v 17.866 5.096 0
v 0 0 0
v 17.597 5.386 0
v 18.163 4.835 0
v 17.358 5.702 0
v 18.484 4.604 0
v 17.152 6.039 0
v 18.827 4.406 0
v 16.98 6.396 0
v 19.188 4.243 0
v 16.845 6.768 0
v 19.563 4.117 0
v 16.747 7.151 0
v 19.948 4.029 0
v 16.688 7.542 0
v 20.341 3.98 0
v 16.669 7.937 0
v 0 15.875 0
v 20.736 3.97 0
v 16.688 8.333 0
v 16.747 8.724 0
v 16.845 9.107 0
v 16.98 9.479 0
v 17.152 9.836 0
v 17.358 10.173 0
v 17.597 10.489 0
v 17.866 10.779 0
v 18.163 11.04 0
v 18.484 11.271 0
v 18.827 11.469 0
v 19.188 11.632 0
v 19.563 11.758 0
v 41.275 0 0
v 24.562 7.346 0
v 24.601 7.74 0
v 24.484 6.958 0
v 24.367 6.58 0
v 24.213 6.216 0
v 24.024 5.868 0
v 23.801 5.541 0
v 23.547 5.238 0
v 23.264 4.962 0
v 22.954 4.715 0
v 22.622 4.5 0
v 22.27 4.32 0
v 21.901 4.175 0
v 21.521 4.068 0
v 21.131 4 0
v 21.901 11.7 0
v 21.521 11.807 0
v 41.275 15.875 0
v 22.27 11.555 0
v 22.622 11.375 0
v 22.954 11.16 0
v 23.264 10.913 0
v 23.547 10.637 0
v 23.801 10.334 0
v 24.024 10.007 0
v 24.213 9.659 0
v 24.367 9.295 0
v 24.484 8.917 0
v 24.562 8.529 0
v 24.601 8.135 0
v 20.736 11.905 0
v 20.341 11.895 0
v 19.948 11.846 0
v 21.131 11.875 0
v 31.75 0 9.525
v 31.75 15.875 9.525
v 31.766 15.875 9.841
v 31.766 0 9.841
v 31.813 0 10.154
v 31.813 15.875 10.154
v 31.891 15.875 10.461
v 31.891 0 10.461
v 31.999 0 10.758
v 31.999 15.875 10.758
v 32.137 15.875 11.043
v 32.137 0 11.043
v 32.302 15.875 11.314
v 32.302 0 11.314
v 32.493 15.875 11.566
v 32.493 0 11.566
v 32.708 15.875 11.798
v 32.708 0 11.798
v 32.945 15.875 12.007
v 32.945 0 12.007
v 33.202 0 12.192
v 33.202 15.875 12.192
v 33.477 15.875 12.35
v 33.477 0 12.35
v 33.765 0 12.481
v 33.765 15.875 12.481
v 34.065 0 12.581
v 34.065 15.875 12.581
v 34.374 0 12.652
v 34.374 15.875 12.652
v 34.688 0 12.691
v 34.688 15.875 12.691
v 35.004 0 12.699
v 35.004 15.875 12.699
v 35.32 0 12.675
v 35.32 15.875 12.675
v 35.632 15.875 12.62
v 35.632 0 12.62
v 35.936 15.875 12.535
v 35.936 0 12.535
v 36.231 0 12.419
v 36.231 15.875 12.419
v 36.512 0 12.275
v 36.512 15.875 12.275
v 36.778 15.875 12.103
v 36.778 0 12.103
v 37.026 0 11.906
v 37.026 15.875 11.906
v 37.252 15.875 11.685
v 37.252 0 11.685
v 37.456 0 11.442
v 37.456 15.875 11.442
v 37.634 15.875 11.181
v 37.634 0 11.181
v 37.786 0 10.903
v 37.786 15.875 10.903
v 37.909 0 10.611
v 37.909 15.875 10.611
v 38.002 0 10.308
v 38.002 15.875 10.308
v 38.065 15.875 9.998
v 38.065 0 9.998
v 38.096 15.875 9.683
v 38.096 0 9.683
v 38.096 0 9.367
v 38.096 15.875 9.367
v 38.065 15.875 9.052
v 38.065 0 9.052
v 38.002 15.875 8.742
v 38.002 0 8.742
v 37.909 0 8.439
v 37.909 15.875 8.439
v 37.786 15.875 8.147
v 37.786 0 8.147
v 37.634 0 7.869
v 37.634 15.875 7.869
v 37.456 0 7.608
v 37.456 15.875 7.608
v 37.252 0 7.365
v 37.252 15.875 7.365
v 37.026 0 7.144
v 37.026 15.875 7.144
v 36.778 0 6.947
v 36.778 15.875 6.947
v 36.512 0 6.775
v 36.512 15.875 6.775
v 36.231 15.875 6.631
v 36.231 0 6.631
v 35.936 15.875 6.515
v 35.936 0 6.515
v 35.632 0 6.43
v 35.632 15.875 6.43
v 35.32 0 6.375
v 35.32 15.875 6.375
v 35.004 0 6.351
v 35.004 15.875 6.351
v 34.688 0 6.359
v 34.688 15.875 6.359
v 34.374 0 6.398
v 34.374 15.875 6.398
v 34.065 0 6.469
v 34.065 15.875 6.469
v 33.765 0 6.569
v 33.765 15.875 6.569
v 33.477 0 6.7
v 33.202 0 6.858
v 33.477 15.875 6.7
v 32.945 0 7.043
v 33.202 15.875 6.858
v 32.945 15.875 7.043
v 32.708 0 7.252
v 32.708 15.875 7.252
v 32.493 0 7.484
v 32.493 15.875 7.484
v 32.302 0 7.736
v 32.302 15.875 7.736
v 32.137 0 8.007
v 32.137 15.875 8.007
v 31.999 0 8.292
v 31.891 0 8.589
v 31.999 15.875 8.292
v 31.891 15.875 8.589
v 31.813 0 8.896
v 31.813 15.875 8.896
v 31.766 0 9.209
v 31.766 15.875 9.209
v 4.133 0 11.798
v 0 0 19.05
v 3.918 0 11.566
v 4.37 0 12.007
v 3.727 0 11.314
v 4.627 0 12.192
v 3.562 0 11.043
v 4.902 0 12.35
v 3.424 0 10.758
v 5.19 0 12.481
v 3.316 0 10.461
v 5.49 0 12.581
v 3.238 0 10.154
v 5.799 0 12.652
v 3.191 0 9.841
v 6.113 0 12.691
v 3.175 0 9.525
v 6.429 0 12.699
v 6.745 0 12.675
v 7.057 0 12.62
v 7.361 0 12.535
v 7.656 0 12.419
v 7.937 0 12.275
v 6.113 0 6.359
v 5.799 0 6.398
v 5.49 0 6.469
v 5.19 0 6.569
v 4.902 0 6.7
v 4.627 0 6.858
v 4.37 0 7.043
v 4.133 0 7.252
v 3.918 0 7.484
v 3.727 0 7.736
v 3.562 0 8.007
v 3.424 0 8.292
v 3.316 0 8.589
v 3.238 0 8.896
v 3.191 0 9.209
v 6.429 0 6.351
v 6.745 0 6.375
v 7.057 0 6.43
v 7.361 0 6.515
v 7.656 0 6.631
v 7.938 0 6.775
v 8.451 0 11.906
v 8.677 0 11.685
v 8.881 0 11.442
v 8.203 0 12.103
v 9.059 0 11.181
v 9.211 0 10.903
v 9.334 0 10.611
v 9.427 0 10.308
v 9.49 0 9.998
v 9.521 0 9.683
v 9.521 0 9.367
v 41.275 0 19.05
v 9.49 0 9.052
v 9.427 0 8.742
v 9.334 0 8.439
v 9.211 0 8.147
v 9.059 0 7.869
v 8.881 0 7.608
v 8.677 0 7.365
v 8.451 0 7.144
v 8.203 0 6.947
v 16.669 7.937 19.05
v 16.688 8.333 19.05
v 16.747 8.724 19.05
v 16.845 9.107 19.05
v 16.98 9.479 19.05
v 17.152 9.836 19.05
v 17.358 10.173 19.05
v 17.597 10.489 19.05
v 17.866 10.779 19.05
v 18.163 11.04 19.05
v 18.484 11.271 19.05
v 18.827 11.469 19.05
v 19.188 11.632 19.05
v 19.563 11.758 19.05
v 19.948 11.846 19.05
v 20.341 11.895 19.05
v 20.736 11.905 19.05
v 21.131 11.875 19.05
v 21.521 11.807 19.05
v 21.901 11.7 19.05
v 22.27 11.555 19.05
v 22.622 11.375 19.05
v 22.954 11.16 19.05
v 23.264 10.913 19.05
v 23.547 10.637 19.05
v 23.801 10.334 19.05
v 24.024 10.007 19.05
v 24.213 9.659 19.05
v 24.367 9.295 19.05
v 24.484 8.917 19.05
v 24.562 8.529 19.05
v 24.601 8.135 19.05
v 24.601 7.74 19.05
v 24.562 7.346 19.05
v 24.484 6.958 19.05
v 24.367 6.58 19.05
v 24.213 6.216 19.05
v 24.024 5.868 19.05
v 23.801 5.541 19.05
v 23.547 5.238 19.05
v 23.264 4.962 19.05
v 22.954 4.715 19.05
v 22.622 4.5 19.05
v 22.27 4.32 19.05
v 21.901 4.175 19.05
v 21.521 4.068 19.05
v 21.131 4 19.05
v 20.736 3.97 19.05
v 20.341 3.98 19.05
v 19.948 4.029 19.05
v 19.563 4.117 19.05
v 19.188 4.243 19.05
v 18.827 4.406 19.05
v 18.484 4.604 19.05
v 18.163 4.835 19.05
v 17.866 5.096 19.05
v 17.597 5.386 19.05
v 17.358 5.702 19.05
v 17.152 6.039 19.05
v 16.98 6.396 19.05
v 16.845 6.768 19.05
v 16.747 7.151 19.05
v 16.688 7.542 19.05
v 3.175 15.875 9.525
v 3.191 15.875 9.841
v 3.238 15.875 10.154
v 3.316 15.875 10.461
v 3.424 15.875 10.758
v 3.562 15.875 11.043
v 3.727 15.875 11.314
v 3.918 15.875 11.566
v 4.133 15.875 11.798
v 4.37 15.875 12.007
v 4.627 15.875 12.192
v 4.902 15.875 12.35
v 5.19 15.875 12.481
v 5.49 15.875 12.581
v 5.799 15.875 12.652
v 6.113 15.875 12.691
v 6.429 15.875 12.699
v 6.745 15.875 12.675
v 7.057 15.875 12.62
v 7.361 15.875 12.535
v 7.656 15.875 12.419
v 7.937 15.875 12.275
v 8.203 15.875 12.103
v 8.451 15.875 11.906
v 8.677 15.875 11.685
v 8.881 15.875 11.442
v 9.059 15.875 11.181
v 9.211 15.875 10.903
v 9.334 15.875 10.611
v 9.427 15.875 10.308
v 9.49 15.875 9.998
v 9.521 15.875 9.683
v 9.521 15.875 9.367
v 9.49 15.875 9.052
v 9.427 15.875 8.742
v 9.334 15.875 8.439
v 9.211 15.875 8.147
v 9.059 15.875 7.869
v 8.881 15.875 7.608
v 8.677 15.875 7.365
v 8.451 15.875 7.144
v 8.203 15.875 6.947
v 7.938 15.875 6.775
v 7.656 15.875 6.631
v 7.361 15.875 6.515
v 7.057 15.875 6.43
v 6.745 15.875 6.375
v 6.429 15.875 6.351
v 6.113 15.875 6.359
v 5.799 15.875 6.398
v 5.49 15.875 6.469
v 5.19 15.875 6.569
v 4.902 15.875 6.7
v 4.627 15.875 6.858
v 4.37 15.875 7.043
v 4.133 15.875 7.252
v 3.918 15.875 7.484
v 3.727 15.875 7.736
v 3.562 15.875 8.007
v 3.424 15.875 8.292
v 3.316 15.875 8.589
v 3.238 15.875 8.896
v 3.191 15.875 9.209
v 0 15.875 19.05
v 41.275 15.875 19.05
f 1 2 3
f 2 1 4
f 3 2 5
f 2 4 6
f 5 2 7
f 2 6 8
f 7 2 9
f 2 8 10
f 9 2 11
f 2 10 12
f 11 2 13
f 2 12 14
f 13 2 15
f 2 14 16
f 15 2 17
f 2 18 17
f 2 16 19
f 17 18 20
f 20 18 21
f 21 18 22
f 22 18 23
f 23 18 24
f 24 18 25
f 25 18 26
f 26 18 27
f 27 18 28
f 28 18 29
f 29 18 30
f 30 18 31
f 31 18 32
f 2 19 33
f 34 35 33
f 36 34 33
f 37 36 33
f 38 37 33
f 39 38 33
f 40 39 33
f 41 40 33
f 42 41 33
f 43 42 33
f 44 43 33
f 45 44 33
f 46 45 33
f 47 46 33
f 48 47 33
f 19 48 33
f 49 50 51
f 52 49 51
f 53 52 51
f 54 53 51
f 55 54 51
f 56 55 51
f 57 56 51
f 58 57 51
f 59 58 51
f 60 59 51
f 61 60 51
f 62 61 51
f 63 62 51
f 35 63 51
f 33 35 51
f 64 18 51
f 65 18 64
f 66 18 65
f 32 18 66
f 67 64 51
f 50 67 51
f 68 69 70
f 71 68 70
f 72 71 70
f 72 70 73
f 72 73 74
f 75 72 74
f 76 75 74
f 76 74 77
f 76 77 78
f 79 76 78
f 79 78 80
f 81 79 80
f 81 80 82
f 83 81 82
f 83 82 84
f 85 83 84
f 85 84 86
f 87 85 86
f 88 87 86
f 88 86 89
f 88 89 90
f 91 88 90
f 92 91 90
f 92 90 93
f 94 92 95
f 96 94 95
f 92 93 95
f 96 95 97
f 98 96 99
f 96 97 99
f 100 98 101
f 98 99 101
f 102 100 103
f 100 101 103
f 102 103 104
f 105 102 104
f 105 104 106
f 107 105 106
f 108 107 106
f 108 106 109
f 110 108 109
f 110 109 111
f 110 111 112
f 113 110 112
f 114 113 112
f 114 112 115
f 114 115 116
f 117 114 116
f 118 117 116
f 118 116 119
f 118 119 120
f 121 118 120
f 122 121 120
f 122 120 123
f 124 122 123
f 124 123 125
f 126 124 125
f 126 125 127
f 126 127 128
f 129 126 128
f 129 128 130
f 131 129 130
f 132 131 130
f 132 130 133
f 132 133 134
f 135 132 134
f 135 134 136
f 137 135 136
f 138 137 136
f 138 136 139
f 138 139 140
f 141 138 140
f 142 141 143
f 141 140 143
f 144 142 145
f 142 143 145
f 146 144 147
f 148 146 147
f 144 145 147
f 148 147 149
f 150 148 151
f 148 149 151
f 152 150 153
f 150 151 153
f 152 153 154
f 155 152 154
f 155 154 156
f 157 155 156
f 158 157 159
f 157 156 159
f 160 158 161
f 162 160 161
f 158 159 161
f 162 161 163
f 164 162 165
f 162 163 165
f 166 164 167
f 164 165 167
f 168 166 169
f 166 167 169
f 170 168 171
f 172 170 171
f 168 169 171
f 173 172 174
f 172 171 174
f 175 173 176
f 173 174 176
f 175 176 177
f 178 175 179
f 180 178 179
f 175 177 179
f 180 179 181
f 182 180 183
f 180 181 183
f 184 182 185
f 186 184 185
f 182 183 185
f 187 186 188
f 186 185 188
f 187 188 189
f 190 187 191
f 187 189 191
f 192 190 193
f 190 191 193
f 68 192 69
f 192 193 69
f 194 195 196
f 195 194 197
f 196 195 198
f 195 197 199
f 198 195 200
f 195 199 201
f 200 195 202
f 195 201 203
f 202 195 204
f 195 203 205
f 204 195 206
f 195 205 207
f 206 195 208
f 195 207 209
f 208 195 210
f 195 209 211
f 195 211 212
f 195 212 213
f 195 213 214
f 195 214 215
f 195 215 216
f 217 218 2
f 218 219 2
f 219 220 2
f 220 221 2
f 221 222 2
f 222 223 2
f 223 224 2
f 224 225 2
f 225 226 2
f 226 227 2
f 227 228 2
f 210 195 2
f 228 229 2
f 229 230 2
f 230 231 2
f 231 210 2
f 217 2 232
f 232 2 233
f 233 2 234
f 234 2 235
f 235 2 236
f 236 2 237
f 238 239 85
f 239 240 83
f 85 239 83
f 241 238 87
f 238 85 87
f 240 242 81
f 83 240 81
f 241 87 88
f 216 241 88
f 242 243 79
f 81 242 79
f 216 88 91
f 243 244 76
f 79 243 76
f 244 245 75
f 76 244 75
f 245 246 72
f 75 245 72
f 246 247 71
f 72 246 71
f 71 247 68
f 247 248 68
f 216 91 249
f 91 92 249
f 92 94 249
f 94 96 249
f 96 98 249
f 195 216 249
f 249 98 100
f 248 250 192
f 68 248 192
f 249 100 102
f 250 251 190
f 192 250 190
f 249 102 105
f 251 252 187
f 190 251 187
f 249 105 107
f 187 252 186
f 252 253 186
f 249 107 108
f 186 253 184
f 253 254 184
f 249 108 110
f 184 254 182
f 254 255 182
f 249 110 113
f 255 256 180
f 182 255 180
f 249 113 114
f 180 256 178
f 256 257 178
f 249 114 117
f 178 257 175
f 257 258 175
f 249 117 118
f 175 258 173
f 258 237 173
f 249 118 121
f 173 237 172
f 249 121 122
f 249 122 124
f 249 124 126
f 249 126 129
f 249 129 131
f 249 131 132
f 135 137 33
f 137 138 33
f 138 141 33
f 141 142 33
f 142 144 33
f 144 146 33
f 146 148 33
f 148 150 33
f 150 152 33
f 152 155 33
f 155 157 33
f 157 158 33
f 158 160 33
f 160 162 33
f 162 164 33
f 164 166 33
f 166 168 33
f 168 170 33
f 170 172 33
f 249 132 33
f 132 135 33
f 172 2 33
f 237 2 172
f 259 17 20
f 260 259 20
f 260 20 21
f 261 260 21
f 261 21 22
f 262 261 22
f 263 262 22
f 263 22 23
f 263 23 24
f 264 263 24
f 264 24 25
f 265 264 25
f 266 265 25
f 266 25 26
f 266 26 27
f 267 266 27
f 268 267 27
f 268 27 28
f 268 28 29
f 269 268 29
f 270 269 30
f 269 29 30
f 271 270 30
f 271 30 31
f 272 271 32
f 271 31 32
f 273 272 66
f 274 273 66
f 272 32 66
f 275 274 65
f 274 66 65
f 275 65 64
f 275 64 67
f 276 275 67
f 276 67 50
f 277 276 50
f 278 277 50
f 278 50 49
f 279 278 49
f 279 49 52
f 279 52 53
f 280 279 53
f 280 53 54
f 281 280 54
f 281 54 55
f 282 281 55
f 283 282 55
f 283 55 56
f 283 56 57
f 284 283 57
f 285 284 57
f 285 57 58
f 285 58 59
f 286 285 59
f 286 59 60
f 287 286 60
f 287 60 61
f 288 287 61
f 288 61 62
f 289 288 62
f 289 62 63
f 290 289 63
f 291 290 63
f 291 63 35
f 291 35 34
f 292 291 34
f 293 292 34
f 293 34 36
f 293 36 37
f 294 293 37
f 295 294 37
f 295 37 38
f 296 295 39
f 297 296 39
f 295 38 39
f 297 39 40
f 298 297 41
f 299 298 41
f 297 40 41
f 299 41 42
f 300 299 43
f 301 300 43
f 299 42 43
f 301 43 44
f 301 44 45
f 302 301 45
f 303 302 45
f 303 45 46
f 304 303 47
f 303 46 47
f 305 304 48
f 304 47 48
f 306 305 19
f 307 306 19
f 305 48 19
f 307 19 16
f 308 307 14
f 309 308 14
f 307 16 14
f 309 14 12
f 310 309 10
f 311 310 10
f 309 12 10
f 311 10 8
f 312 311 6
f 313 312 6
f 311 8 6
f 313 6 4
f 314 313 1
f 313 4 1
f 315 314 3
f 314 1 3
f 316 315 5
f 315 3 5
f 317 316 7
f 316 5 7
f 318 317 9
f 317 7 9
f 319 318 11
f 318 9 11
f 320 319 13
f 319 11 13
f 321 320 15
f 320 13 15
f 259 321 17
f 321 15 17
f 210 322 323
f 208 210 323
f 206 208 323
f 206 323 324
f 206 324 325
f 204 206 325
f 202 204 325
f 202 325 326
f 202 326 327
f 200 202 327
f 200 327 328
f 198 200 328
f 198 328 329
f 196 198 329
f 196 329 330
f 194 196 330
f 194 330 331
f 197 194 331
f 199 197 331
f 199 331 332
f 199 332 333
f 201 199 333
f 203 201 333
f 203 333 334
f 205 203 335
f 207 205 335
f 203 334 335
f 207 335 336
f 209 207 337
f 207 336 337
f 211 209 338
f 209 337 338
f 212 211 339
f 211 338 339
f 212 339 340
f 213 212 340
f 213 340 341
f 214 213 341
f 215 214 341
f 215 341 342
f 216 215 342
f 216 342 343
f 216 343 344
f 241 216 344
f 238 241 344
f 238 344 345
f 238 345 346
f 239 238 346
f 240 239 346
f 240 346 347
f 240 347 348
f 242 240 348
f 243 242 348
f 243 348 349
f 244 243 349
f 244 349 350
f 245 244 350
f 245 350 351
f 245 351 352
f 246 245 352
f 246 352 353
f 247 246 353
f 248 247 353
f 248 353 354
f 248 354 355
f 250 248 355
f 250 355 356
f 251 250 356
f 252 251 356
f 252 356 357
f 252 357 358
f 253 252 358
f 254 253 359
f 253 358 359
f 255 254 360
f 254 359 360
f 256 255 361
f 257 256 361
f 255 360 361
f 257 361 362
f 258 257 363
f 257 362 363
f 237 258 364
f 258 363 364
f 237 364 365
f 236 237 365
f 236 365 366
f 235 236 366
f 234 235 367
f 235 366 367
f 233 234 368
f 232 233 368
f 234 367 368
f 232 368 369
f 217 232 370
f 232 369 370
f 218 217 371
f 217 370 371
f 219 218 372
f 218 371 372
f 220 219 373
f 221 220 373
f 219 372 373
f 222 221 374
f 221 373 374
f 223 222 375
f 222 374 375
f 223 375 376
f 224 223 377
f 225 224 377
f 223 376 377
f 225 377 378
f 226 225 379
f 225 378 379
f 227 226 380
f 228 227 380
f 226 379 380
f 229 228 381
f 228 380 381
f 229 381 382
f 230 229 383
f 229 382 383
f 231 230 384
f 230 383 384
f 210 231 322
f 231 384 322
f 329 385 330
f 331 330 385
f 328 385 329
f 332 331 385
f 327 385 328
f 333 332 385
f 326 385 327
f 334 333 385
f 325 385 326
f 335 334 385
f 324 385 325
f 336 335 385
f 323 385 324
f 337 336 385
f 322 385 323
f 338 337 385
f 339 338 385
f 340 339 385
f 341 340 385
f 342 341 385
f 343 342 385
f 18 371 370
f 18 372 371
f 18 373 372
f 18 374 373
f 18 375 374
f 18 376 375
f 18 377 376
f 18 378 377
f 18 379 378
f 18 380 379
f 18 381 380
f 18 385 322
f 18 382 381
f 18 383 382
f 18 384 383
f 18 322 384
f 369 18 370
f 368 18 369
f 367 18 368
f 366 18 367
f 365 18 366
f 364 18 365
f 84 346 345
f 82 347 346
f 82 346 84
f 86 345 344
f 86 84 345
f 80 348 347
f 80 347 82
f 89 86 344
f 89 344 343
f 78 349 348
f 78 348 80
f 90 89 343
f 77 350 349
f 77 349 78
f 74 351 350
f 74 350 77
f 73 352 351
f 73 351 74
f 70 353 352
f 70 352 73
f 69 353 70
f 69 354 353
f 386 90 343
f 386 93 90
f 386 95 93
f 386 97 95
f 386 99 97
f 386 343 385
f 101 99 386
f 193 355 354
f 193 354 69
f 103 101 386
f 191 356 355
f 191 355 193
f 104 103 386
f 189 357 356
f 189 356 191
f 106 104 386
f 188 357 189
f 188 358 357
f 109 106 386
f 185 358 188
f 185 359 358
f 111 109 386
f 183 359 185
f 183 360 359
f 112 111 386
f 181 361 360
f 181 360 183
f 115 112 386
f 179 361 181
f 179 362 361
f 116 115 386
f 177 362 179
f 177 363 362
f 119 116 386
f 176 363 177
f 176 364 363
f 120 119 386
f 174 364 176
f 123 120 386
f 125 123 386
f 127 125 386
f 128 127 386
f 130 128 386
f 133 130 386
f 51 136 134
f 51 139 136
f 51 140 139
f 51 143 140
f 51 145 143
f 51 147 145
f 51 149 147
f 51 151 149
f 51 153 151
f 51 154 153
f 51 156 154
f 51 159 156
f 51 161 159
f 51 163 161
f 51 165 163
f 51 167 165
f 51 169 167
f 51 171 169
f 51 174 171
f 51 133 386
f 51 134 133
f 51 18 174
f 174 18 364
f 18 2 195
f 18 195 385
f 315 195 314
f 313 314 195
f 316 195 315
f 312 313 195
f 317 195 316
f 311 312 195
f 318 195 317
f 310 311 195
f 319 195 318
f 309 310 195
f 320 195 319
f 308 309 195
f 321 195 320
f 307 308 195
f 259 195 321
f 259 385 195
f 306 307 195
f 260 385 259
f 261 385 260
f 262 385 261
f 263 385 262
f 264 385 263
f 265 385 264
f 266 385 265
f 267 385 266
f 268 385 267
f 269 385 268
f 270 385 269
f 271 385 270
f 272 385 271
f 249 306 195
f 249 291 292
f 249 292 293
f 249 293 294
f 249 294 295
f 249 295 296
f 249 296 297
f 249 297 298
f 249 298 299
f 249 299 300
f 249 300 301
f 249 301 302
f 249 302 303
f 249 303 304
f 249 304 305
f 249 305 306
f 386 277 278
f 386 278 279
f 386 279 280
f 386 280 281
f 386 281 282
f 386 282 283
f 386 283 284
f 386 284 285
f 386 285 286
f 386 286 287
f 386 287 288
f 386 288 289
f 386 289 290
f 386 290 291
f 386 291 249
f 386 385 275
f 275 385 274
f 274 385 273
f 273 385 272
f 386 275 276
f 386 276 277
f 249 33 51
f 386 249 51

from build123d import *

# Parameters (mm, degrees)
F0_W     = 41.275
F0_H     = 15.875
F1_DEPTH = 19.05
F3_D     = 7.9375
F5_D     = 6.35


with BuildPart() as f1:
    # F0 (on Top) → F1 (new body)
    with BuildSketch(Plane.XY):
        with Locations((20.6375, 7.9375)):
            Rectangle(F0_W, F0_H)
    extrude(amount=F1_DEPTH)

    # F3 (through all)
    with Locations(Plane.XY.offset(19.05)):
        with Locations((20.6375, 7.9375)):
            Hole(F3_D / 2)

    # F5 (through all)
    with Locations(Plane.XZ):
        with Locations((6.35, 9.525), (34.925, 9.525)):
            Hole(F5_D / 2)


solid = f1.part
